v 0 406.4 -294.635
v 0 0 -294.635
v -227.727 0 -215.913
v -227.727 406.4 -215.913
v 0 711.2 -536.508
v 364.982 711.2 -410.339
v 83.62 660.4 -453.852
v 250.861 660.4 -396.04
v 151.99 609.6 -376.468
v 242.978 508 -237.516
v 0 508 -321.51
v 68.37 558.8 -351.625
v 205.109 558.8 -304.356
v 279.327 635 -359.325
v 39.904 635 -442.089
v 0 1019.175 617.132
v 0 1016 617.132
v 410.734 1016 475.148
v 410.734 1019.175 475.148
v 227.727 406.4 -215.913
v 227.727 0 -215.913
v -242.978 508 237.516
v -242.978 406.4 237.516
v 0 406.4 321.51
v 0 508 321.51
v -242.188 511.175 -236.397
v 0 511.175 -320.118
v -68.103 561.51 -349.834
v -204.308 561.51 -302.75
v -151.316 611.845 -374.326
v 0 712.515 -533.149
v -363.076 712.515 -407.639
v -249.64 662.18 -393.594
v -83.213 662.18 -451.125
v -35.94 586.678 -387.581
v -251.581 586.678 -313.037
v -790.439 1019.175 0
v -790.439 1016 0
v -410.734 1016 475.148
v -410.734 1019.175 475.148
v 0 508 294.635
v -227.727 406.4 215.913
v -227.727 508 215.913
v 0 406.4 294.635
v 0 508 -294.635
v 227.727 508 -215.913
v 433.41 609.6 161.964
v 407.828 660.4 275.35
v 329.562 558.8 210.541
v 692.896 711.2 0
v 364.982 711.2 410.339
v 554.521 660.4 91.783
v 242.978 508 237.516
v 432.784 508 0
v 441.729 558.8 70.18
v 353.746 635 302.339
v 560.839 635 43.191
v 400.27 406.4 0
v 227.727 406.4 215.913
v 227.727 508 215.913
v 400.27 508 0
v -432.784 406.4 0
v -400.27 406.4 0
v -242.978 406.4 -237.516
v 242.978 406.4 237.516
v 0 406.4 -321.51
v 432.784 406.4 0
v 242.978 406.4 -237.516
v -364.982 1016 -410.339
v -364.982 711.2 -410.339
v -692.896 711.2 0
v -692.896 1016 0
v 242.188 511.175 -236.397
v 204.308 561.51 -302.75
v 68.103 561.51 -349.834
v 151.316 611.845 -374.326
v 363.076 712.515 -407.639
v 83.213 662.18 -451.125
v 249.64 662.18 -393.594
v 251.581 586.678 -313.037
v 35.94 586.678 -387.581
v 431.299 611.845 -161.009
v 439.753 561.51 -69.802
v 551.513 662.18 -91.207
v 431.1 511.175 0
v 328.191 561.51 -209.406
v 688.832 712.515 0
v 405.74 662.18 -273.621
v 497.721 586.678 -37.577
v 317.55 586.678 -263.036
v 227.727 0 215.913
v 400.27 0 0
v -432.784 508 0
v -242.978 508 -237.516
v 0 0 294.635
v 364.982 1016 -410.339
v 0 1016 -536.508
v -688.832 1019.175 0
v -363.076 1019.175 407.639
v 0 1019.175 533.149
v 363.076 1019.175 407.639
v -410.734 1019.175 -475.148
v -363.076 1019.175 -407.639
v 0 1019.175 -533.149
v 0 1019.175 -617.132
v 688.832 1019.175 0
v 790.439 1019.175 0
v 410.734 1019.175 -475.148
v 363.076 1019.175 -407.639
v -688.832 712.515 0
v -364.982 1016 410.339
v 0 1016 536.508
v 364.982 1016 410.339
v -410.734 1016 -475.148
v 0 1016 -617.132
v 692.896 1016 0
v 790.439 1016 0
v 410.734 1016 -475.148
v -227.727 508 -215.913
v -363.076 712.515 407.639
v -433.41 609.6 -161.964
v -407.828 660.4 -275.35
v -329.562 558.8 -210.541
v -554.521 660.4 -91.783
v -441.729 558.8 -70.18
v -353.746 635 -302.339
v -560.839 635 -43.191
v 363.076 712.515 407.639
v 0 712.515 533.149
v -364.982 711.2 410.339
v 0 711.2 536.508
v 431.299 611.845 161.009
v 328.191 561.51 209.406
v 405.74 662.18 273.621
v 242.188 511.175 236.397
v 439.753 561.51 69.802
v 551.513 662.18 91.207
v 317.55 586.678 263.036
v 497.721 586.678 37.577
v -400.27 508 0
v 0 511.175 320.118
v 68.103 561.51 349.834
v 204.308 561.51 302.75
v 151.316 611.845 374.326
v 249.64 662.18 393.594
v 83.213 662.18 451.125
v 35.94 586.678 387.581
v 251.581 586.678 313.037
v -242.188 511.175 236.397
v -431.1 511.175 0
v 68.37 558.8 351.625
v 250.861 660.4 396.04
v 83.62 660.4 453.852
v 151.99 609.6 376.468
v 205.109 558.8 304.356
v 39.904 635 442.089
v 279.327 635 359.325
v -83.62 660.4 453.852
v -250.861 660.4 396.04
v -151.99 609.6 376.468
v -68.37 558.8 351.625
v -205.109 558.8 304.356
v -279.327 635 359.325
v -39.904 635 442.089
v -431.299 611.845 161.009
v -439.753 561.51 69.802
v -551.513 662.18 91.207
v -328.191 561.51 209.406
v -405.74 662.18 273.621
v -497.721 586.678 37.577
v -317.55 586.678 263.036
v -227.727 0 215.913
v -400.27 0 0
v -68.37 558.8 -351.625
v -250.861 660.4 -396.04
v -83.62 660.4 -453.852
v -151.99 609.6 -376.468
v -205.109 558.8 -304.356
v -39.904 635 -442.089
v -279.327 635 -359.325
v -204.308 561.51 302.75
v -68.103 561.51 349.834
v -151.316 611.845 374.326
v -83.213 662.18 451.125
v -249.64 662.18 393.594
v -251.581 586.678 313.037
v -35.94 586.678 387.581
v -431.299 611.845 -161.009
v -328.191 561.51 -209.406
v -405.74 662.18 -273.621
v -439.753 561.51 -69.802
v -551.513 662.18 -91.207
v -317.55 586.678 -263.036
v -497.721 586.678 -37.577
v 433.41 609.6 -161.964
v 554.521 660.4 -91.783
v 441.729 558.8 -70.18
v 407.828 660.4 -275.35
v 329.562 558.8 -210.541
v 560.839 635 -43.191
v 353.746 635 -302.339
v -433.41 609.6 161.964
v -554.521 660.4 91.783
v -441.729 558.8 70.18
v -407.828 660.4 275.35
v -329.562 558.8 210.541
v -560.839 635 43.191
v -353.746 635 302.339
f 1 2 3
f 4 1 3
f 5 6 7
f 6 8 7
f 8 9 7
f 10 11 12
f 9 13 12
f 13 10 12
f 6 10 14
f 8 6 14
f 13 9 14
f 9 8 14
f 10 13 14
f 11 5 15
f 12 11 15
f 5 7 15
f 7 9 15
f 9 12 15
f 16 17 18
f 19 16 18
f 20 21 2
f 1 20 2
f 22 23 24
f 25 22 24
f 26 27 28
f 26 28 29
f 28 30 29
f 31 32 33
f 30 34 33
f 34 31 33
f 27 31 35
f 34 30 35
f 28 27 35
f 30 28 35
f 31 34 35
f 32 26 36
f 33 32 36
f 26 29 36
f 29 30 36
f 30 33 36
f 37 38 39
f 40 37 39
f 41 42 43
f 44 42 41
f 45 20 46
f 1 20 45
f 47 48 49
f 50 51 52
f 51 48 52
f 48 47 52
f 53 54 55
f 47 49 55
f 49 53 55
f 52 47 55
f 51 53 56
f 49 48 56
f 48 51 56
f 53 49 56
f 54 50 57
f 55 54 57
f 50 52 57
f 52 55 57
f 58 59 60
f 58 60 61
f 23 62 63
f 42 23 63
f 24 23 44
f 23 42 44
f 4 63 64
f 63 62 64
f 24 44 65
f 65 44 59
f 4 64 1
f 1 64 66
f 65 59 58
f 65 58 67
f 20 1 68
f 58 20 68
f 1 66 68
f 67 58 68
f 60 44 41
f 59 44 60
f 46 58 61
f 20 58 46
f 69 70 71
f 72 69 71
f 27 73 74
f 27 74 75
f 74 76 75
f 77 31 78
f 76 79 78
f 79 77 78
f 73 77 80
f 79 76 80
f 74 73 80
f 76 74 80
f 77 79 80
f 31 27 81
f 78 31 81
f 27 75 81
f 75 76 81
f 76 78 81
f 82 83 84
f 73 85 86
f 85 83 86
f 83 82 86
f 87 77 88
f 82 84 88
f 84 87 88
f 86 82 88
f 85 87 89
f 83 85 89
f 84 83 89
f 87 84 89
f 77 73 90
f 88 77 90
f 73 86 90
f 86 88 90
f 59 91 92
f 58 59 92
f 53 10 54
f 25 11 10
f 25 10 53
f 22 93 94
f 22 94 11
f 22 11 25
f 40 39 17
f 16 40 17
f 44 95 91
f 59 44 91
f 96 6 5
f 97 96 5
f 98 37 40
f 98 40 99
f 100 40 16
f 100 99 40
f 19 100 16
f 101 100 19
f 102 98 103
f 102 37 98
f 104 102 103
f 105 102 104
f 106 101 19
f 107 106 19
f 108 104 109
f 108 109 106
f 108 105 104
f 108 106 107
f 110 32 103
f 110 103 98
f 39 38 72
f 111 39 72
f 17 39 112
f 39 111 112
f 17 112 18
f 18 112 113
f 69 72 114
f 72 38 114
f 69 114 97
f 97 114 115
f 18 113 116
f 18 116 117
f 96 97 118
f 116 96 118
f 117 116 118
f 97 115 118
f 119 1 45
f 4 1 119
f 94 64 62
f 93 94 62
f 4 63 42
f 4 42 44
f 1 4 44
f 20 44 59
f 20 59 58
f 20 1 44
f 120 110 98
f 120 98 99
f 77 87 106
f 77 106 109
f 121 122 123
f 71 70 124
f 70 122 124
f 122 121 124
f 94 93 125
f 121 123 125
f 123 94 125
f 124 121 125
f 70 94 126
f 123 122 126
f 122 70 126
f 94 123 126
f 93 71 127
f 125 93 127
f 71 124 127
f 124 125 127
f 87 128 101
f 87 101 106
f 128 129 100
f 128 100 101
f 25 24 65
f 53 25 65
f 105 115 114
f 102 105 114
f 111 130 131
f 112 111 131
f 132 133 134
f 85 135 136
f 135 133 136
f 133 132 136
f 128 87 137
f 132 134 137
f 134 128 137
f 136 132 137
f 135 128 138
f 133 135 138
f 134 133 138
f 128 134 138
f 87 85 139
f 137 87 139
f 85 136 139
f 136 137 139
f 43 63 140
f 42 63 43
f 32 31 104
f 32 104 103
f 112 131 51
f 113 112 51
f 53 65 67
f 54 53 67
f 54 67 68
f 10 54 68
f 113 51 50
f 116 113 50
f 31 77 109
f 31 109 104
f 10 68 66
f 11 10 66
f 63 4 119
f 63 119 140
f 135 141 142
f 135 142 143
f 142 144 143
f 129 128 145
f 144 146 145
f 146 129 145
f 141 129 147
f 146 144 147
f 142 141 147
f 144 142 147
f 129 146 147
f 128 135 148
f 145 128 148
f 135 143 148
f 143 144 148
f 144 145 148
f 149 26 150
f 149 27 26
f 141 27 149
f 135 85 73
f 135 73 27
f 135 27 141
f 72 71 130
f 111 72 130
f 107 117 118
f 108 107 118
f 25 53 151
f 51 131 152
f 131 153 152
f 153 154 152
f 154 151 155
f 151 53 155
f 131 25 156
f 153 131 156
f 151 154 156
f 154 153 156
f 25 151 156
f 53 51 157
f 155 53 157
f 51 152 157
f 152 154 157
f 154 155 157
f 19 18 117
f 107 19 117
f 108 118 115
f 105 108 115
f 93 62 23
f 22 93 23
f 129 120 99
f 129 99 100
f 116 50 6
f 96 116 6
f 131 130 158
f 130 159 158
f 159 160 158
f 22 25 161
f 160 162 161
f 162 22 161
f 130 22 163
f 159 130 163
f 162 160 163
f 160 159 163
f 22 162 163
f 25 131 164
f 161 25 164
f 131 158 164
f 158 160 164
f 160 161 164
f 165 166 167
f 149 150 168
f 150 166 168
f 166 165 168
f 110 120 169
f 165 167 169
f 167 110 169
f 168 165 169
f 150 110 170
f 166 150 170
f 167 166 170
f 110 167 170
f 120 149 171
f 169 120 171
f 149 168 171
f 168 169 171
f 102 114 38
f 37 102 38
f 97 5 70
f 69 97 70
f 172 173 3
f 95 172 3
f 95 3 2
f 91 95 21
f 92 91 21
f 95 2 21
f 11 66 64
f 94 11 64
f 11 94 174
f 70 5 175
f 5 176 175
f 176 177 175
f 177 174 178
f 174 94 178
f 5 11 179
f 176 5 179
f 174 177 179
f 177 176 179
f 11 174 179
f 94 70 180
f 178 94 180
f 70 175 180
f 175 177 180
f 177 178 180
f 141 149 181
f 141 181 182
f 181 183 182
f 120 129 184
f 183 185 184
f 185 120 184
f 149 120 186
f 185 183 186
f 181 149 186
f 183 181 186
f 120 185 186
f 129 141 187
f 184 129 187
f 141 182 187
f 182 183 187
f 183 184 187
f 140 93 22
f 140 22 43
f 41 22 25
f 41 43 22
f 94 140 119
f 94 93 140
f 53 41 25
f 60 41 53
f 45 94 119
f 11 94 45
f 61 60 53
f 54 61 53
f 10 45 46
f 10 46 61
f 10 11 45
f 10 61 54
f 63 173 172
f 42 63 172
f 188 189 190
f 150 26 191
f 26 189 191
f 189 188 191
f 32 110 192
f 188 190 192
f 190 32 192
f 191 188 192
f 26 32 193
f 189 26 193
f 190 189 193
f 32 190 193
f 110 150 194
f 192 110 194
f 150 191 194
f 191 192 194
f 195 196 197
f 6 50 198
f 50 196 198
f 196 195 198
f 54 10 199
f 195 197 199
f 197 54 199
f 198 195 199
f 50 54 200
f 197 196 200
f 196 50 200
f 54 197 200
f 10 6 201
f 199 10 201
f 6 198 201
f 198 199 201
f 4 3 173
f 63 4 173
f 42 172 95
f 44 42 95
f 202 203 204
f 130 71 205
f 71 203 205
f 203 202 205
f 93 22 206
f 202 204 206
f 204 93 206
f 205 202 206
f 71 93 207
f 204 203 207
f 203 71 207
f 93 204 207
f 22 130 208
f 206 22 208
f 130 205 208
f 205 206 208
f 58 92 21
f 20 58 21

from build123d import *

# Parameters (mm, degrees)
BOSS_EXTRUDE1_DEPTH = 406.4
BOSS_EXTRUDE2_DEPTH = 101.6
BOSS_EXTRUDE3_DEPTH = 304.8
BOSS_EXTRUDE4_DEPTH = 3.175
SHELL3_START        = 712.515128061
SHELL3_DEPTH        = 306.659871939


with BuildPart() as part:
    # Sketch2 → Boss-Extrude1 (new body)
    with BuildSketch(Plane(origin=(0, 0, 0), x_dir=(1, 0, 0), z_dir=(0, 1, 0))):
        Polygon((-227.727393818, 215.912914456), (-400.269809967, 0), (-227.727393818, -215.912914456), (0, -294.634699703), (227.727393818, -215.912914456), (400.269809967, 0), (227.727393818, 215.912914456), (0, 294.634699703), align=None)
    extrude(amount=BOSS_EXTRUDE1_DEPTH)


with BuildPart() as body_2:
    # Sketch3 → Boss-Extrude2 (new body)
    with BuildSketch(Plane(origin=(0, 406.4, 0), x_dir=(1, 0, 0), z_dir=(0, 1, 0))):
        Polygon((0, 321.509503803), (-242.977909201, 237.515854786), (-432.783875933, 0), (-242.977909201, -237.515854786), (0, -321.509503803), (242.977909201, -237.515854786), (432.783875933, 0), (242.977909201, 237.515854786), align=None)
        Polygon((0, 294.634699703), (-227.727393818, 215.912914456), (-400.269809967, 0), (-227.727393818, -215.912914456), (0, -294.634699703), (227.727393818, -215.912914456), (400.269809967, 0), (227.727393818, 215.912914456), align=None, mode=Mode.SUBTRACT)
    extrude(amount=BOSS_EXTRUDE2_DEPTH)


with BuildPart() as body_3:
    # Sketch5 → Loft1 section 0
    with BuildSketch(Plane(origin=(0, 711.2, 0), x_dir=(1, 0, 0), z_dir=(0, 1, 0))):
        with BuildLine():
            Line((0, 536.5079366), (-364.98203226, 410.339377425))
            Line((-364.98203226, 410.339377425), (-692.896403665, 0))
            Line((-692.896403665, 0), (-364.98203226, -410.339377425))
            Line((-364.98203226, -410.339377425), (0, -536.5079366))
            Line((0, -536.5079366), (364.98203226, -410.339377425))
            Line((364.98203226, -410.339377425), (692.896403665, 0))
            Line((692.896403665, 0), (364.98203226, 410.339377425))
            Line((364.98203226, 410.339377425), (0, 536.5079366))
        make_face()
    # Sketch4 → Loft1 section 1
    with BuildSketch(Plane(origin=(0, 508, 0), x_dir=(1, 0, 0), z_dir=(0, 1, 0))):
        with BuildLine():
            Line((-242.977909201, 237.515854786), (-432.783875933, 0))
            Line((-432.783875933, 0), (-242.977909201, -237.515854786))
            Line((-242.977909201, -237.515854786), (0, -321.509503803))
            Line((0, -321.509503803), (242.977909201, -237.515854786))
            Line((242.977909201, -237.515854786), (432.783875933, 0))
            Line((432.783875933, 0), (242.977909201, 237.515854786))
            Line((242.977909201, 237.515854786), (0, 321.509503803))
            Line((0, 321.509503803), (-242.977909201, 237.515854786))
        make_face()
    loft()

    # Sketch6 → Boss-Extrude3 (add)
    with BuildSketch(Plane(origin=(0, 711.2, 0), x_dir=(1, 0, 0), z_dir=(0, 1, 0))):
        Polygon((-364.98203226, -410.339377425), (0, -536.5079366), (364.98203226, -410.339377425), (692.896403665, 0), (364.98203226, 410.339377425), (0, 536.5079366), (-364.98203226, 410.339377425), (-692.896403665, 0), align=None)
    extrude(amount=BOSS_EXTRUDE3_DEPTH)

    # Sketch7 → Boss-Extrude4 (add)
    with BuildSketch(Plane(origin=(0, 1016, 0), x_dir=(1, 0, 0), z_dir=(0, 1, 0))):
        Polygon((-790.438601564, 0), (-410.733578407, -475.148198415), (0, -617.132348899), (410.733578407, -475.148198415), (790.438601564, 0), (410.733578407, 475.148198415), (0, 617.132348899), (-410.733578407, 475.148198415), align=None)
    extrude(amount=BOSS_EXTRUDE4_DEPTH)

    # Shell3: read off the stored shape, not the designer's step
    # Shell3 outline → Shell3 (cut)
    with BuildSketch(Plane(origin=(0, 0, 0), x_dir=(1, 0, 0), z_dir=(0, 1, 0)).offset(SHELL3_START)):
        Polygon((-688.832145419, 0), (-363.075717837, -407.639009884), (0, -533.148586088), (363.075717837, -407.639009884), (688.832145419, 0), (363.075717837, 407.639009884), (0, 533.148586088), (-363.075717837, 407.639009884), align=None)
    extrude(amount=SHELL3_DEPTH, mode=Mode.SUBTRACT)

    # Shell3 2: loft between two sections, ruled curve by curve
    shell3_2_from = [
        Edge.make_line((-242.188287913, 511.175, -236.397325927), (-431.100405047, 511.175, 0)),
        Edge.make_line((-431.100405047, 511.175, 0), (-242.188287913, 511.175, 236.397325927)),
        Edge.make_line((0, 511.175, -320.11801526), (-242.188287913, 511.175, -236.397325927)),
        Edge.make_line((242.188287913, 511.175, -236.397325927), (0, 511.175, -320.11801526)),
        Edge.make_line((431.100405047, 511.175, 0), (242.188287913, 511.175, -236.397325927)),
        Edge.make_line((242.188287913, 511.175, 236.397325927), (431.100405047, 511.175, 0)),
        Edge.make_line((0, 511.175, 320.11801526), (242.188287913, 511.175, 236.397325927)),
        Edge.make_line((-242.188287913, 511.175, 236.397325927), (0, 511.175, 320.11801526)),
    ]
    shell3_2_to = [
        Edge.make_line((-363.075717837, 712.515128061, -407.639009884), (-688.832145419, 712.515128061, 0)),
        Edge.make_line((-688.832145419, 712.515128061, 0), (-363.075717837, 712.515128061, 407.639009884)),
        Edge.make_line((0, 712.515128061, -533.148586088), (-363.075717837, 712.515128061, -407.639009884)),
        Edge.make_line((363.075717837, 712.515128061, -407.639009884), (0, 712.515128061, -533.148586088)),
        Edge.make_line((688.832145419, 712.515128061, 0), (363.075717837, 712.515128061, -407.639009884)),
        Edge.make_line((363.075717837, 712.515128061, 407.639009884), (688.832145419, 712.515128061, 0)),
        Edge.make_line((0, 712.515128061, 533.148586088), (363.075717837, 712.515128061, 407.639009884)),
        Edge.make_line((-363.075717837, 712.515128061, 407.639009884), (0, 712.515128061, 533.148586088)),
    ]
    shell3_2 = Solid(Shell([*[Face.make_surface_from_curves(shell3_2_from[k], shell3_2_to[k]) for k in range(8)], Face(Wire(shell3_2_from)), Face(Wire(shell3_2_to))]))
    add(shell3_2, mode=Mode.SUBTRACT)


solid = Compound([part.part, body_2.part, body_3.part])
